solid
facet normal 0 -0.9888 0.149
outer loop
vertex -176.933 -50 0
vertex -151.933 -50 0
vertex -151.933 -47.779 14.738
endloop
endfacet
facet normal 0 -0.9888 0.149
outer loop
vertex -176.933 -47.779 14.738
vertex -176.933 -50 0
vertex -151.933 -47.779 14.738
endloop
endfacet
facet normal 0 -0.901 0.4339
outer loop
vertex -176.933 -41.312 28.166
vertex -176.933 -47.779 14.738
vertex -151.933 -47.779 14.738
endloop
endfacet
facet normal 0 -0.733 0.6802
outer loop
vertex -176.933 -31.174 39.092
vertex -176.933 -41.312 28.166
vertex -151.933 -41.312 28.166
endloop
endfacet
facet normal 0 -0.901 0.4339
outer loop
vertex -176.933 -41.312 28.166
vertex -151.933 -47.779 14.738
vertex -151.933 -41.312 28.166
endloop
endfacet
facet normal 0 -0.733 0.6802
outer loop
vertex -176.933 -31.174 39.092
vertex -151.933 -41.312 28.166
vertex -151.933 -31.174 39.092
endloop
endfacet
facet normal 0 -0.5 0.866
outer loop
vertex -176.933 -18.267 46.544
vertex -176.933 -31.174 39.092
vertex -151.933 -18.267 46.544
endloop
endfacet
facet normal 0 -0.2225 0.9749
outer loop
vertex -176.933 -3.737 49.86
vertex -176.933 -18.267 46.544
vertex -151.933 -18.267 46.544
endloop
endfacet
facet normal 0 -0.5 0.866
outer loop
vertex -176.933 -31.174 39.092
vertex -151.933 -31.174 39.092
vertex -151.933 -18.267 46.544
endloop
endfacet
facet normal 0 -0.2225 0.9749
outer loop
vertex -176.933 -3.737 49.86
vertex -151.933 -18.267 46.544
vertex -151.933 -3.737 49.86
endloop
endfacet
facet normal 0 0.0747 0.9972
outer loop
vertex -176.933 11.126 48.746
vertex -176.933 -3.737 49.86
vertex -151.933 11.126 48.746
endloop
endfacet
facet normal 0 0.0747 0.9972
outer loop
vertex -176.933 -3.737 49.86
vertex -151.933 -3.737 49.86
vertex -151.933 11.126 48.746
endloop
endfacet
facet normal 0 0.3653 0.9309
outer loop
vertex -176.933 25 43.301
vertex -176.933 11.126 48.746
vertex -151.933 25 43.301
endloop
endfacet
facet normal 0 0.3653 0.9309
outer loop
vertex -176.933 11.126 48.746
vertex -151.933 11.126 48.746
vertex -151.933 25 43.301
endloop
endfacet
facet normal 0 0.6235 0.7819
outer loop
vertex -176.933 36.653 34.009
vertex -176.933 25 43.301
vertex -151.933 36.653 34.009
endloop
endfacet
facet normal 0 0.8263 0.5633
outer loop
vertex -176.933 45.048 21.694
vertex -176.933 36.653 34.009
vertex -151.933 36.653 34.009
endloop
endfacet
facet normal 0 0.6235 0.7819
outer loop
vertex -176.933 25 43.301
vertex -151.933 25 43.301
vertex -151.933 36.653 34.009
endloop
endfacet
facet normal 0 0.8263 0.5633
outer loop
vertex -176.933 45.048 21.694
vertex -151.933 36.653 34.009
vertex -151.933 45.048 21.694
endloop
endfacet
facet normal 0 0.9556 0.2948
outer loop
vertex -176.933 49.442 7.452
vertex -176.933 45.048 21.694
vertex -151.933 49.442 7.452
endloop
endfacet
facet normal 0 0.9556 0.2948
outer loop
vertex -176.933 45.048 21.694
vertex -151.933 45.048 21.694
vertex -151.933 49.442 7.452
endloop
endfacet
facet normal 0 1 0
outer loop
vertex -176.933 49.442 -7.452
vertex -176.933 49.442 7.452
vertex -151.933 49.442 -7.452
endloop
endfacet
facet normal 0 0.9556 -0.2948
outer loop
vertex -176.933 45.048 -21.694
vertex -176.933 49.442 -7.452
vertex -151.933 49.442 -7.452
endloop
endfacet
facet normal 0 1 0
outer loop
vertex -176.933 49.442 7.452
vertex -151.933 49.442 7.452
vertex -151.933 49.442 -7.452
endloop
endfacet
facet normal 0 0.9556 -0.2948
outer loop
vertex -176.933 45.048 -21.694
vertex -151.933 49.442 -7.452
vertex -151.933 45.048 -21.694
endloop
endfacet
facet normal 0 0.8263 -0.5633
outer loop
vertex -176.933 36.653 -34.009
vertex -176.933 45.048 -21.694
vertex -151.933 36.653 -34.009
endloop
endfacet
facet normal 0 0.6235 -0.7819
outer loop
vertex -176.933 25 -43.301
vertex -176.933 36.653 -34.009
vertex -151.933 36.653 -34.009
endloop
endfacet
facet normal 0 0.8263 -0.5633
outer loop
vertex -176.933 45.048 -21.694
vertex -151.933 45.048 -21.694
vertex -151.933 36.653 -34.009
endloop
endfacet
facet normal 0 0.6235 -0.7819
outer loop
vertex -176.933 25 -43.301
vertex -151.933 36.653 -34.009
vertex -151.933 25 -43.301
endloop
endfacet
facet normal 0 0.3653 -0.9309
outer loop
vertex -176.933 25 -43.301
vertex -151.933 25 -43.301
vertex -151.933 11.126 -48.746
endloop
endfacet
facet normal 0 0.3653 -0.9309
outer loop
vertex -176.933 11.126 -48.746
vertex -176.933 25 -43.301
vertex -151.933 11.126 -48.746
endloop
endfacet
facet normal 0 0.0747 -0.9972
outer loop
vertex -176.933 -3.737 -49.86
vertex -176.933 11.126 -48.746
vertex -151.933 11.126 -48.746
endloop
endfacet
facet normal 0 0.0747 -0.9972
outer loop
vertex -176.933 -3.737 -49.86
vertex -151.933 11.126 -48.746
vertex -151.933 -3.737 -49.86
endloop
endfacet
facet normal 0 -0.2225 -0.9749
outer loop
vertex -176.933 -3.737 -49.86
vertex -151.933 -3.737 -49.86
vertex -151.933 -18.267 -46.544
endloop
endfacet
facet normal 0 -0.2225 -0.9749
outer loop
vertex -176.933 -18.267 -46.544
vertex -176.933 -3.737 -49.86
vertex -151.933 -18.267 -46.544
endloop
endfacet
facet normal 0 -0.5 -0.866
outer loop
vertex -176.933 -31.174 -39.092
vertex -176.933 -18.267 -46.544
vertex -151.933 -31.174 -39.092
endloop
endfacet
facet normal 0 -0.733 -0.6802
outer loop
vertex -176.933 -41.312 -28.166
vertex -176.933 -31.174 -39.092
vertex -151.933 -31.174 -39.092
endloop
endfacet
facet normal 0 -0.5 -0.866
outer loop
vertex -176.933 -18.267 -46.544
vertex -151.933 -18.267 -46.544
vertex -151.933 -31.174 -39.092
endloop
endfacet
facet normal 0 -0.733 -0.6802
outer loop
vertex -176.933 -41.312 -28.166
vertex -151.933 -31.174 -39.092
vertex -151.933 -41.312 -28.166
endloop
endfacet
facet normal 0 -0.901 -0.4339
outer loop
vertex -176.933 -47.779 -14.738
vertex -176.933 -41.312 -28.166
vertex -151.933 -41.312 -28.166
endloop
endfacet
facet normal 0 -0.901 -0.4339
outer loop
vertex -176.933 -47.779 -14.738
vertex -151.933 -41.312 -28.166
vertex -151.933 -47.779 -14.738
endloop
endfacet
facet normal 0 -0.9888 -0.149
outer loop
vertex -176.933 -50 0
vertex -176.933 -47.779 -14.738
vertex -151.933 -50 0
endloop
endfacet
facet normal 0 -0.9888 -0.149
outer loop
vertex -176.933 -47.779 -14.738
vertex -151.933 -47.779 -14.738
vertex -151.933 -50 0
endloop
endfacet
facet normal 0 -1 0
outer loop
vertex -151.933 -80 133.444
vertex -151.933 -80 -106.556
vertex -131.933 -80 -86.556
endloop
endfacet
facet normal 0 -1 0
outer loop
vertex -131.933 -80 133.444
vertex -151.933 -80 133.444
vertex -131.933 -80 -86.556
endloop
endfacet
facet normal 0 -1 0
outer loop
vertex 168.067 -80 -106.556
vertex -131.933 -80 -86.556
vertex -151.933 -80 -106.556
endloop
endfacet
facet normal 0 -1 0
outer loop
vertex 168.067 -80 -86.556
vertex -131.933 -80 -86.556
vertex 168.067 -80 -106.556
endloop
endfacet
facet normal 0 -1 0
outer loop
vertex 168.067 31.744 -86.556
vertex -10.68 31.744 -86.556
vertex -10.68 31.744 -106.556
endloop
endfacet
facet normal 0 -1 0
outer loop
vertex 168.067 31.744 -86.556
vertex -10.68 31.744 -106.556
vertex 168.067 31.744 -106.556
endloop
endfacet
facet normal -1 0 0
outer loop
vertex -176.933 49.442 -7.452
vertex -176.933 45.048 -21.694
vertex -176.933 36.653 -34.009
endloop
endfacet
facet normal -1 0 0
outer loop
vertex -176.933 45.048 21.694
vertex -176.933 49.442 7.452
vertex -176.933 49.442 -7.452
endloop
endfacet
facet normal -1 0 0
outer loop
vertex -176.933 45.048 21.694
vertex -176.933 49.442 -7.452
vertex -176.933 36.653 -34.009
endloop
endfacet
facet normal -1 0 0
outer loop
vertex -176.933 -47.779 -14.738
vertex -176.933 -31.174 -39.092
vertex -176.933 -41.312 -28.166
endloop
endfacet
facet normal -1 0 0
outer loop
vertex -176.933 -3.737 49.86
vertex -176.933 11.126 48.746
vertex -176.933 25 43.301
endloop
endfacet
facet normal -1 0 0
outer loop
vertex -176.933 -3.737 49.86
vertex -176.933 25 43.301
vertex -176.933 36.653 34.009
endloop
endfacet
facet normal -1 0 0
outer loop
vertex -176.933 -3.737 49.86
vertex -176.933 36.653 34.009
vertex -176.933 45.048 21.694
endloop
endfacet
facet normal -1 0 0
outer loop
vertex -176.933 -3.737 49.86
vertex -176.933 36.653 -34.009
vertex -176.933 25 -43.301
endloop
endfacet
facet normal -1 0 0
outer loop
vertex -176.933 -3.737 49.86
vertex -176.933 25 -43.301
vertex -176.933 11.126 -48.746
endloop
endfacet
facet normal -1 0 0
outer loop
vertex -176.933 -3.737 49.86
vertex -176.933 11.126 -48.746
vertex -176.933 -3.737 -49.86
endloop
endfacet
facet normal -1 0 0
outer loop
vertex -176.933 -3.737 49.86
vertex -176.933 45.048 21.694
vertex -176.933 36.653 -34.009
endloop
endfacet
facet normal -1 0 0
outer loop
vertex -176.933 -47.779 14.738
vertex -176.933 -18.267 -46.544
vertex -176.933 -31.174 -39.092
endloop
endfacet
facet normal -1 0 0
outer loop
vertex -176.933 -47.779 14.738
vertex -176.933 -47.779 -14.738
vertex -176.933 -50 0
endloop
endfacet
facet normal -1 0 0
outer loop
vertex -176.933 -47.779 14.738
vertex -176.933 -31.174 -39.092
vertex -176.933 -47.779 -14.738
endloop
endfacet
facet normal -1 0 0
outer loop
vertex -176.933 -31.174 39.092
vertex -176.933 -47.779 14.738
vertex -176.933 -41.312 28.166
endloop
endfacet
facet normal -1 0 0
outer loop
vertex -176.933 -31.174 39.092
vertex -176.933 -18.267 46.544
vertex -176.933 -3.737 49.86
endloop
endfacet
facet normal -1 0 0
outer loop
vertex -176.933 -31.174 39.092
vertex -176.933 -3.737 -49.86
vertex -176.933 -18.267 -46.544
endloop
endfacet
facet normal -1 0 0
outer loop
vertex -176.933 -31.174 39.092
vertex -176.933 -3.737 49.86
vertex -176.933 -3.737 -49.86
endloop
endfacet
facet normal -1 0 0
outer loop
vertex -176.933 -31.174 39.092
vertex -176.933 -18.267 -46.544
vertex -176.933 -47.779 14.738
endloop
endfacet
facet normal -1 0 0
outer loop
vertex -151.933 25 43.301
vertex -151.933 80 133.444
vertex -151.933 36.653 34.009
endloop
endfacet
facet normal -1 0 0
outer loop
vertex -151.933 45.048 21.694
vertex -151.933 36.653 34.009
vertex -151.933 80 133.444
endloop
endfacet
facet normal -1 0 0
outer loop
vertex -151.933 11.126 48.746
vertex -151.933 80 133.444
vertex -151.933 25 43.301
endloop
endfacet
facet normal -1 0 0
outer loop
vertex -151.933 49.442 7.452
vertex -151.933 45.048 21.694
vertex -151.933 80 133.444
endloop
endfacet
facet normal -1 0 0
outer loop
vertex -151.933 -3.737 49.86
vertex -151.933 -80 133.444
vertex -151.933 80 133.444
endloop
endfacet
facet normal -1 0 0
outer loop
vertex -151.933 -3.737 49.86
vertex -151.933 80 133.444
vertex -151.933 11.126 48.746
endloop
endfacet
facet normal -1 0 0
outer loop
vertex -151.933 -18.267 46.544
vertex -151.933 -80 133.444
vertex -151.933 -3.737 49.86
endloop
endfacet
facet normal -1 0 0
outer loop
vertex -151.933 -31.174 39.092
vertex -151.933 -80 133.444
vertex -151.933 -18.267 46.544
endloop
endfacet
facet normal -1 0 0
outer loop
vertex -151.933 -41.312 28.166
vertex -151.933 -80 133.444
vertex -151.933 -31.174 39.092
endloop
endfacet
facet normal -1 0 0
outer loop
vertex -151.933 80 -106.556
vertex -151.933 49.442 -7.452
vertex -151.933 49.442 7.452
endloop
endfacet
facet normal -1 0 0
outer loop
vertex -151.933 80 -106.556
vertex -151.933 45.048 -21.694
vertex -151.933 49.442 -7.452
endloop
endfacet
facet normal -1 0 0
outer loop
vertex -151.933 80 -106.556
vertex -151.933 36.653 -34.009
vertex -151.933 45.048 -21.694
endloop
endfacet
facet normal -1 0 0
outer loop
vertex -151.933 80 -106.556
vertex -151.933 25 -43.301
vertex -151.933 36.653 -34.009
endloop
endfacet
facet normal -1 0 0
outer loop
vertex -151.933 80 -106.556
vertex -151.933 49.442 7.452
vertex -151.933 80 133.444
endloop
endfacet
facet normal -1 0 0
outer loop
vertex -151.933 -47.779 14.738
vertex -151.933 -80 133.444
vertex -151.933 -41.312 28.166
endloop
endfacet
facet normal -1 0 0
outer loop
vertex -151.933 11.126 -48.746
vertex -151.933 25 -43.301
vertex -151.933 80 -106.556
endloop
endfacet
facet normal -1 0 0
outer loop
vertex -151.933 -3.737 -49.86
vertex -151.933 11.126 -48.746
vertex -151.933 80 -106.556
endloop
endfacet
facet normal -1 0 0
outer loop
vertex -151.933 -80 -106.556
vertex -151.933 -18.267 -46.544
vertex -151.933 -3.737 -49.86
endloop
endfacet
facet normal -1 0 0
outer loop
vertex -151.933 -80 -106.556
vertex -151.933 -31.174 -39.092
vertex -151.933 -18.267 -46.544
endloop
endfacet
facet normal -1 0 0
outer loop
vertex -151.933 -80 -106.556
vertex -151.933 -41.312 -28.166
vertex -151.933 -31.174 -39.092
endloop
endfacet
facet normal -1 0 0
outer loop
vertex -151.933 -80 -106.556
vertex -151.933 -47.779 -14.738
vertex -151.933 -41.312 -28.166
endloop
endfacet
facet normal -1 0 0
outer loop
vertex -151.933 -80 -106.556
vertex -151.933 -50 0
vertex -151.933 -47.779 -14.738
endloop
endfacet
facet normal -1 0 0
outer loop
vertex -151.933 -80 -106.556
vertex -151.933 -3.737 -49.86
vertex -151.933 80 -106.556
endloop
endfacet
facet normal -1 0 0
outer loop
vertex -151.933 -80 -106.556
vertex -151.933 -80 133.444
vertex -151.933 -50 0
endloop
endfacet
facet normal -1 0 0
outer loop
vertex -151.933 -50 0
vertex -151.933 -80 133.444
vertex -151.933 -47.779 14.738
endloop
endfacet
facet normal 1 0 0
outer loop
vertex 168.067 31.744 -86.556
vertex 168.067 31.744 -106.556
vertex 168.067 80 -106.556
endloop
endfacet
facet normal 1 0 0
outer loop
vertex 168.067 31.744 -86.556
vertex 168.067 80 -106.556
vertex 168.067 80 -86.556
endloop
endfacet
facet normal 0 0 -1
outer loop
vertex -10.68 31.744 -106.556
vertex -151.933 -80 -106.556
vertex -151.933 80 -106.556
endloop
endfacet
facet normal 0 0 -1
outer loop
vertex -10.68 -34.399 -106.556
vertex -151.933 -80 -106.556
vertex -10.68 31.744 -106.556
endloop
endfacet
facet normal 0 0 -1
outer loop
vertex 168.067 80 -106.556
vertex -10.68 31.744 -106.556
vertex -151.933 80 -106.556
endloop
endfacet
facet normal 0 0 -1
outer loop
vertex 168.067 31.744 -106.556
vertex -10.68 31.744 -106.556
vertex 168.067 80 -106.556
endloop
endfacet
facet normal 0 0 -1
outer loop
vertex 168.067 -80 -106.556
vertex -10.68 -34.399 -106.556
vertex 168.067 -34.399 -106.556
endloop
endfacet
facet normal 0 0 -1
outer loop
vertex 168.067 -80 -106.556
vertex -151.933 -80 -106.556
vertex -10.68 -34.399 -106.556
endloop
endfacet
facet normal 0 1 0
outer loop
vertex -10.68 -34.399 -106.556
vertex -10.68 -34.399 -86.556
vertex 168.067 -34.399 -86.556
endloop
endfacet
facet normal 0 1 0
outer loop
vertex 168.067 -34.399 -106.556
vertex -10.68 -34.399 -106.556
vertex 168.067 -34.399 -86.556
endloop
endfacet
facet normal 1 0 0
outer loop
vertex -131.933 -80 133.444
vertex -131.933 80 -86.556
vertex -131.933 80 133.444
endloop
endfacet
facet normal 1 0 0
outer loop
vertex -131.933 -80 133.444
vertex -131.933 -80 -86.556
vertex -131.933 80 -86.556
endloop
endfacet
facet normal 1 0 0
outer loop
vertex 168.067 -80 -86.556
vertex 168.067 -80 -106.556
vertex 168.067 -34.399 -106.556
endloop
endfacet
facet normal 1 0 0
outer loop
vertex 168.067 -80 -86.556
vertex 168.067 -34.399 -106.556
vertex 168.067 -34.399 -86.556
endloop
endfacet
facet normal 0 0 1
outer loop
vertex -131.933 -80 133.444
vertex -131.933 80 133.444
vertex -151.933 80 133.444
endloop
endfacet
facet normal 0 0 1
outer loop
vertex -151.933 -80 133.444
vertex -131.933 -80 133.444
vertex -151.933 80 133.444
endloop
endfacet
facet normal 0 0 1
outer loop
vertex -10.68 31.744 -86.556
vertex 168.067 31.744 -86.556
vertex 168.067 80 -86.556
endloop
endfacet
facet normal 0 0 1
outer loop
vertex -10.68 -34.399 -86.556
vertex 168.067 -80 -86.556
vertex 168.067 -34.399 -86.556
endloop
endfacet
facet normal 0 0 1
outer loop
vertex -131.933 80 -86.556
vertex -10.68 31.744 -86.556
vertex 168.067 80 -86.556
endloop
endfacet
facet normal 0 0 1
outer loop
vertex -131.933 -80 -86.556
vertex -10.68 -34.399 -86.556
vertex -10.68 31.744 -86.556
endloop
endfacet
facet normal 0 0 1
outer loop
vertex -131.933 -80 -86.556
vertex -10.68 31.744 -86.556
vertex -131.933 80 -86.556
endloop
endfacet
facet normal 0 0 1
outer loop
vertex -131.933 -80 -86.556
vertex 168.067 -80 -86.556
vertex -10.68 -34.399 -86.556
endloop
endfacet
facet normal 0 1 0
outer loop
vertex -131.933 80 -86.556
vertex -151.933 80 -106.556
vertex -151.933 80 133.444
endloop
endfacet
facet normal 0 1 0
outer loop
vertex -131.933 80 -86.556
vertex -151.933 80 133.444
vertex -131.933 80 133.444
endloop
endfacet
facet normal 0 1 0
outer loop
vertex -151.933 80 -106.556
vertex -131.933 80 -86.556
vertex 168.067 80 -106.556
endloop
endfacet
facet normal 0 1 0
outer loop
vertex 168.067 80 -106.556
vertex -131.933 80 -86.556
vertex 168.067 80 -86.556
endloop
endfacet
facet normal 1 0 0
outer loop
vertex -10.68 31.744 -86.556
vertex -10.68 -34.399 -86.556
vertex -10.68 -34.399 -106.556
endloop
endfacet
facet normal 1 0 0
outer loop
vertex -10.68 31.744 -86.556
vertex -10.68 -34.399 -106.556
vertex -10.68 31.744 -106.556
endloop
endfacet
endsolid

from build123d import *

# Parameters (mm, degrees)
F1_DEPTH = 80
F2_W     = 178.746274
F2_H     = 66.143535
F3_DEPTH = 25
F4_R     = 50
F5_DEPTH = 25


with BuildPart() as f1:
    # F0 (on Front) → F1 (new body, symmetric)
    with BuildSketch(Plane.XZ):
        Polygon((-151.933498, 133.443999), (-151.933498, 15.624951), (-151.933498, -106.556001), (168.066502, -106.556001), (168.066502, -86.556001), (-131.933498, -86.556001), (-131.933498, 133.443999), align=None)
    extrude(amount=F1_DEPTH, both=True)

    # F2 (on face) → F3 (cut)
    with BuildSketch(Plane.XY.offset(-86.556001)):
        with Locations((78.693365, -1.327616)):
            Rectangle(F2_W, F2_H)
    extrude(amount=-F3_DEPTH, mode=Mode.SUBTRACT)

    # F4 (on face) → F5 (join)
    with BuildSketch(Plane(origin=(-151.933498, 0, 0), x_dir=(0, -1, 0), z_dir=(-1, 0, 0))):
        Circle(F4_R)
    extrude(amount=F5_DEPTH)


solid = f1.part
